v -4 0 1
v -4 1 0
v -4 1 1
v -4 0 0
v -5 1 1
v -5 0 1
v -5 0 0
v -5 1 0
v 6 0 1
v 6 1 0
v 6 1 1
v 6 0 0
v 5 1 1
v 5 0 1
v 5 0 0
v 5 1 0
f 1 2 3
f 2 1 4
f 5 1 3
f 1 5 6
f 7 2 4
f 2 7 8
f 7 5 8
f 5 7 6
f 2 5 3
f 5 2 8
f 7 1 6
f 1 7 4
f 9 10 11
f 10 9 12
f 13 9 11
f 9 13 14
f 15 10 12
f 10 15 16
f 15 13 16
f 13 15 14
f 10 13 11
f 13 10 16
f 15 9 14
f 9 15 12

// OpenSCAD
hull() {
  for (i = [0:1]) {
    cylinder(h=0);
  }
}

translate([-5, 0, 0]) cube();
translate([5, 0, 0]) cube();
